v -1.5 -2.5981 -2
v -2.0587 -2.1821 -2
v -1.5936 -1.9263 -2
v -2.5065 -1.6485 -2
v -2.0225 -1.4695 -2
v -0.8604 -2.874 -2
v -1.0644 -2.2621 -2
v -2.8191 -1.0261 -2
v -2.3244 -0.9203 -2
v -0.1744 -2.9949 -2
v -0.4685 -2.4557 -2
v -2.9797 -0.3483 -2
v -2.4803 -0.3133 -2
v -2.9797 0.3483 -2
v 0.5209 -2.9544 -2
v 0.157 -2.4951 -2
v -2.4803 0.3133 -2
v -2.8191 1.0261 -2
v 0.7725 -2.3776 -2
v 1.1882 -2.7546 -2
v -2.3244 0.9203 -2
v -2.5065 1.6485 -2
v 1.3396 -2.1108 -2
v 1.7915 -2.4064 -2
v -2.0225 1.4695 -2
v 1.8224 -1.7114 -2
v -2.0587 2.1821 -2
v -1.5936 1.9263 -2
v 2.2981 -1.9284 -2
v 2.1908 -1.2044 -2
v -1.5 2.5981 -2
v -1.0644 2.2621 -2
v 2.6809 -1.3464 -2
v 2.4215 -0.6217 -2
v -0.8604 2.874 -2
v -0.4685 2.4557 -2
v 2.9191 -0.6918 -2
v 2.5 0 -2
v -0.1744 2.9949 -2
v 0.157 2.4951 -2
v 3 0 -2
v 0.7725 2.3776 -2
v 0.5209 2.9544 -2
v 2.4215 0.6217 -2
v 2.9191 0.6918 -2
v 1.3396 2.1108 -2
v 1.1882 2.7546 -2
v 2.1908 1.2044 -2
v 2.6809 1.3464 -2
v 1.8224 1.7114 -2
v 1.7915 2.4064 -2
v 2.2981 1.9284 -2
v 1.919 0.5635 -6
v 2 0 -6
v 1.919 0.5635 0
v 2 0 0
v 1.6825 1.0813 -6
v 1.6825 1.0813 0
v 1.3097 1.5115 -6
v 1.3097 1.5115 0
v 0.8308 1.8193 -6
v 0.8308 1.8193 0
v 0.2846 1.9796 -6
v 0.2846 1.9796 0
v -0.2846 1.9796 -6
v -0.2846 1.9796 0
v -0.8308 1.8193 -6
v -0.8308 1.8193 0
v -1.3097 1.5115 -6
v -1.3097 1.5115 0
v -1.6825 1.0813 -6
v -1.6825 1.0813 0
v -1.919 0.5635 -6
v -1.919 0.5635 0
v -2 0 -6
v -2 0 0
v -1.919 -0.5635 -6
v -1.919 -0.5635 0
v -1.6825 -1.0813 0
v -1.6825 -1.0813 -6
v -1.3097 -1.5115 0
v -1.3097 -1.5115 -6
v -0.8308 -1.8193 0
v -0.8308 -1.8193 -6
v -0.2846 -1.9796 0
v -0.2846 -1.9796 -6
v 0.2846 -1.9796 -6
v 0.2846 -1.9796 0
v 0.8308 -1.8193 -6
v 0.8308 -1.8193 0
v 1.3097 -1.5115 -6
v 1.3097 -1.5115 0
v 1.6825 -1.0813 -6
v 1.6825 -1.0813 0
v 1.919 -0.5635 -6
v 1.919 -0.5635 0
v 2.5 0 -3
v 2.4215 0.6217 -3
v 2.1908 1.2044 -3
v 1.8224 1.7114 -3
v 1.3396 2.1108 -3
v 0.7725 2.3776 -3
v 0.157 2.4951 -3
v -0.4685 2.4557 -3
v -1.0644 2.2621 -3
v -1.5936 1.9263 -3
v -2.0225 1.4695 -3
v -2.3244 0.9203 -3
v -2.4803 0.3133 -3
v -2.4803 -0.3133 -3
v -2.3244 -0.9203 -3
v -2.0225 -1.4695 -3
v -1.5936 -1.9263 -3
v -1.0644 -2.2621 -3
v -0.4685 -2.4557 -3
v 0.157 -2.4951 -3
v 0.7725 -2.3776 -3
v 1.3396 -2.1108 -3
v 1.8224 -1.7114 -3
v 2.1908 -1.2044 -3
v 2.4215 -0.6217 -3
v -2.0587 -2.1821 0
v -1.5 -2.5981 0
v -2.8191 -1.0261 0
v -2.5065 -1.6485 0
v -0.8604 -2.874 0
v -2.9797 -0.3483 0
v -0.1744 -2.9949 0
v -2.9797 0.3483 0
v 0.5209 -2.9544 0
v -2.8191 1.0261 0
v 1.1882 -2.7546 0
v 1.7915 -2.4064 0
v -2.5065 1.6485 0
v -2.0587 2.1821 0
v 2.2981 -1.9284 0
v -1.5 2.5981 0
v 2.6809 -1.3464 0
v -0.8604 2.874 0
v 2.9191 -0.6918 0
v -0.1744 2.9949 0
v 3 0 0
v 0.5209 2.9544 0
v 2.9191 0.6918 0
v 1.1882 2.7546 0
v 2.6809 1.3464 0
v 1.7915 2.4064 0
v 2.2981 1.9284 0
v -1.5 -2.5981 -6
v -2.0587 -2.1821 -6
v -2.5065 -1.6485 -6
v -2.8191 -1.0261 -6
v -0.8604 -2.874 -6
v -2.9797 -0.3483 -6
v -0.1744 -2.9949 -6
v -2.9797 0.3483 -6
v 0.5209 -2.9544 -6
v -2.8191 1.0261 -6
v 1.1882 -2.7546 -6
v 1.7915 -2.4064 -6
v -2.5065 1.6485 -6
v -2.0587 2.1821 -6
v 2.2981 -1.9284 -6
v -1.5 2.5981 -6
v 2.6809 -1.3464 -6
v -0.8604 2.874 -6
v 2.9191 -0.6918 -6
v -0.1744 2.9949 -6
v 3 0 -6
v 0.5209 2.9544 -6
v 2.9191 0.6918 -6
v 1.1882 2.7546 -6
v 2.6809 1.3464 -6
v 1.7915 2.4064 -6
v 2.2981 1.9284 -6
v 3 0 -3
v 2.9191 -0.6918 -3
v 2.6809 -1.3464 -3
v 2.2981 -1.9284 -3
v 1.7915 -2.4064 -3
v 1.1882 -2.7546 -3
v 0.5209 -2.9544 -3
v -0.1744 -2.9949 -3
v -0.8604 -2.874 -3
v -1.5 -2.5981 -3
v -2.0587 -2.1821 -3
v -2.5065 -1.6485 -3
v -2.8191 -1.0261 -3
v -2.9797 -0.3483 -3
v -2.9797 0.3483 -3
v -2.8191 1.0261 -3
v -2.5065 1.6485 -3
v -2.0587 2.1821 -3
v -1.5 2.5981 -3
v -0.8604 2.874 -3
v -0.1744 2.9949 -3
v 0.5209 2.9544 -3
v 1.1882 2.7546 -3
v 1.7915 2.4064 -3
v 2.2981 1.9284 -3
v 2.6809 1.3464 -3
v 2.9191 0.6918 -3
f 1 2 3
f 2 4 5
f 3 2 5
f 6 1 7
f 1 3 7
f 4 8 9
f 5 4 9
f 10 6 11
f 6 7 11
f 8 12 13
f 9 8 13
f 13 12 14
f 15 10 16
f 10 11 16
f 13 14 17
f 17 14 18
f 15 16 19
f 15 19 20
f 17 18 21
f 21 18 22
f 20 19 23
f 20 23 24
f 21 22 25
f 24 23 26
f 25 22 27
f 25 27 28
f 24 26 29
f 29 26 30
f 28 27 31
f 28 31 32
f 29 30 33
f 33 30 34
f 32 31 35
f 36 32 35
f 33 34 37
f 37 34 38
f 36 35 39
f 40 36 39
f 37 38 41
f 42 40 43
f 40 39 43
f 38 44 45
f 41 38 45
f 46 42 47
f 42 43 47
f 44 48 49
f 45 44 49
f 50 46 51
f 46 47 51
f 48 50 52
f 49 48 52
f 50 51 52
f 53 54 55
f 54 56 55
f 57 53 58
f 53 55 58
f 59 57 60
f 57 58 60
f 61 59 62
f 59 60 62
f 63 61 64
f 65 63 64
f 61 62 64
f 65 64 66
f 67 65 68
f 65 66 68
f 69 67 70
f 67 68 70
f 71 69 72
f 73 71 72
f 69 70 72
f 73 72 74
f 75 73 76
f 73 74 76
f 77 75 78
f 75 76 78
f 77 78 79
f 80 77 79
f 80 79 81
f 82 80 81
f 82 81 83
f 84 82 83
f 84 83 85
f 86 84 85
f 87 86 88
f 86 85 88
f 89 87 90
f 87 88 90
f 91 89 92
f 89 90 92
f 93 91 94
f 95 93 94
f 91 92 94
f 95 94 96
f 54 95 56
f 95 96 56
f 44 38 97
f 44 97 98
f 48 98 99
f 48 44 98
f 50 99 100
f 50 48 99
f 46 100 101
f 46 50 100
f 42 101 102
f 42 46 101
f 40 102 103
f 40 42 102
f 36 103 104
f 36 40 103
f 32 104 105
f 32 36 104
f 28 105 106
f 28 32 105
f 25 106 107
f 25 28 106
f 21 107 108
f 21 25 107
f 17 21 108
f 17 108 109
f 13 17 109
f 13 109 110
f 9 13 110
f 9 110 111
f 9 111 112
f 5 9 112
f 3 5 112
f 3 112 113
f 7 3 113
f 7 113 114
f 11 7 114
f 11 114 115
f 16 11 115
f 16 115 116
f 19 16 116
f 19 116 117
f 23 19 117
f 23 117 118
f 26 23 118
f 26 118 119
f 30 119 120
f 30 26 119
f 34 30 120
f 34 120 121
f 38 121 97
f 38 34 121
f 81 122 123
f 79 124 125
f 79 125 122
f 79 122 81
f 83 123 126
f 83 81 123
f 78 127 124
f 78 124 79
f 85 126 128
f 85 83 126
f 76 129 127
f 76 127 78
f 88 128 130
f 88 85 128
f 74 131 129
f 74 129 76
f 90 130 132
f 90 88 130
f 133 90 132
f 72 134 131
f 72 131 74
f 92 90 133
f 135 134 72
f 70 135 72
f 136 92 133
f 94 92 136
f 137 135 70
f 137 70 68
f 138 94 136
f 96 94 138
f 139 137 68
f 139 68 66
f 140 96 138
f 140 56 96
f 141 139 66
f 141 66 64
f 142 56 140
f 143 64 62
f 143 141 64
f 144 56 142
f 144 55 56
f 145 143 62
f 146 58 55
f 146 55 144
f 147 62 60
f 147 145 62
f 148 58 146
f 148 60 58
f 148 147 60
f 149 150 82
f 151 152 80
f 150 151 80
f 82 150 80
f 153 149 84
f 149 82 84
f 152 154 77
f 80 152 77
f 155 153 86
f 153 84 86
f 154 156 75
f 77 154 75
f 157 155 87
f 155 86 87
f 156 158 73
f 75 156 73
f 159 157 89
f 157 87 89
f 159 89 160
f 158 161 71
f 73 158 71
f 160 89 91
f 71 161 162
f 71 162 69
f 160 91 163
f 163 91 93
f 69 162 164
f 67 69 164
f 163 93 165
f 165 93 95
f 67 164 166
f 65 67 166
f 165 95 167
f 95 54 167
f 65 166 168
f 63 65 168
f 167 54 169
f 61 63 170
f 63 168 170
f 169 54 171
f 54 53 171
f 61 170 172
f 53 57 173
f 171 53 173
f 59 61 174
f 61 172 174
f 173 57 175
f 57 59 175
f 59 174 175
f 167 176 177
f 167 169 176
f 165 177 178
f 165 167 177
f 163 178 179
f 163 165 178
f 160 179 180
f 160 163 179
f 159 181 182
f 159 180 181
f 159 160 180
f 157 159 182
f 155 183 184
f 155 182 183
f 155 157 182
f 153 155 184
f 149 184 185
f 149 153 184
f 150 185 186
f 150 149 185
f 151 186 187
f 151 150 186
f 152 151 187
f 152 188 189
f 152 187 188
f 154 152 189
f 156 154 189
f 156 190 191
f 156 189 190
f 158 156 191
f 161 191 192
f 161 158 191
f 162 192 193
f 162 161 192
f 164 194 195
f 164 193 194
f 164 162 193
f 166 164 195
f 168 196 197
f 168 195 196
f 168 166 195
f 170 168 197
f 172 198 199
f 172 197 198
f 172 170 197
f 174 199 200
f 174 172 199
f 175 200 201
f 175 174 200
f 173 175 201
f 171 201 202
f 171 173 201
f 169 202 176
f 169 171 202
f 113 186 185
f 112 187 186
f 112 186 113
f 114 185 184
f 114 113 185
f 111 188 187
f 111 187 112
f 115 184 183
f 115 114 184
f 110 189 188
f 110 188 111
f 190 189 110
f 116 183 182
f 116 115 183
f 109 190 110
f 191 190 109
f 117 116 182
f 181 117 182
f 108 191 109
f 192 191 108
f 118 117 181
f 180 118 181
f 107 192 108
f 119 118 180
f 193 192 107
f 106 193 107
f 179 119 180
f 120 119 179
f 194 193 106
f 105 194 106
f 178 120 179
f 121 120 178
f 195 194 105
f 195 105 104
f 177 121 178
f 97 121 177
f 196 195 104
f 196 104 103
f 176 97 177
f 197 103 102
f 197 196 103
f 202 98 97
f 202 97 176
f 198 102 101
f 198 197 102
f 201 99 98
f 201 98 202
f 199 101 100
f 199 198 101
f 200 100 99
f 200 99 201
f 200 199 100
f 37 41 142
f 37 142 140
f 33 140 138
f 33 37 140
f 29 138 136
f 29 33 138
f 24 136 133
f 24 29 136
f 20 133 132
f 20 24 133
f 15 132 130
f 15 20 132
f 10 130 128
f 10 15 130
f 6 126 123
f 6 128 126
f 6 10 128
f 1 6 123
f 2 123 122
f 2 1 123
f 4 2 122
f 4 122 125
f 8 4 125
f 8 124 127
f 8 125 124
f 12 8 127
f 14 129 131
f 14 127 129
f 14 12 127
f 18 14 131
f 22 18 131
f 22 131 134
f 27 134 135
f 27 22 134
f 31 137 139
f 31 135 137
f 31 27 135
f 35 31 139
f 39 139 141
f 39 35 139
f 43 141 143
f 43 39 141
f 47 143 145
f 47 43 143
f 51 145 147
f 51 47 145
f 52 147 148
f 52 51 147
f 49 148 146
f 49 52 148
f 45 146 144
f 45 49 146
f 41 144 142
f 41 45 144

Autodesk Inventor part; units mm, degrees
ref_plane "YZ Plane" through (0, 0, 0) normal (1, 0, 0) x (0, 1, 0)
ref_plane "XZ Plane" through (0, 0, 0) normal (0, 1, 0) x (-1, 0, 0)
ref_plane "XY Plane" through (0, 0, 0) normal (0, 0, 1) x (1, 0, 0)
sketch "Sketch1" plane through (0, 0, 0) normal (0, 1, 0) x (-1, 0, 0)
  line L0 (-1.5, 0) -> (-3, 0)
  line L1 (-3, 0) -> (-3, -2)
  line L2 (-3, -3) -> (-3, -6)
  line L3 (-3, -6) -> (-2, -6)
  line L4 (0, -7.2) -> (0, 1.2) projected
  line L5 (-3, -3) -> (-2.5, -3)
  line L6 (-2.5, -3) -> (-2.5, -2)
  line L7 (-2.5, -2) -> (-3, -2)
  line L8 (-2, -6) -> (-2, 0)
  point P0 (0, 0)
  dimension "d1" = 2
  dimension "d4" = 3
  dimension "d9" = 0.5
revolve "Revolution1" add sketch "Sketch1" angle 360 about axis through (0, 0, -10) along (0, 0, 1)
properties part number "M4-HEATINSERT"
